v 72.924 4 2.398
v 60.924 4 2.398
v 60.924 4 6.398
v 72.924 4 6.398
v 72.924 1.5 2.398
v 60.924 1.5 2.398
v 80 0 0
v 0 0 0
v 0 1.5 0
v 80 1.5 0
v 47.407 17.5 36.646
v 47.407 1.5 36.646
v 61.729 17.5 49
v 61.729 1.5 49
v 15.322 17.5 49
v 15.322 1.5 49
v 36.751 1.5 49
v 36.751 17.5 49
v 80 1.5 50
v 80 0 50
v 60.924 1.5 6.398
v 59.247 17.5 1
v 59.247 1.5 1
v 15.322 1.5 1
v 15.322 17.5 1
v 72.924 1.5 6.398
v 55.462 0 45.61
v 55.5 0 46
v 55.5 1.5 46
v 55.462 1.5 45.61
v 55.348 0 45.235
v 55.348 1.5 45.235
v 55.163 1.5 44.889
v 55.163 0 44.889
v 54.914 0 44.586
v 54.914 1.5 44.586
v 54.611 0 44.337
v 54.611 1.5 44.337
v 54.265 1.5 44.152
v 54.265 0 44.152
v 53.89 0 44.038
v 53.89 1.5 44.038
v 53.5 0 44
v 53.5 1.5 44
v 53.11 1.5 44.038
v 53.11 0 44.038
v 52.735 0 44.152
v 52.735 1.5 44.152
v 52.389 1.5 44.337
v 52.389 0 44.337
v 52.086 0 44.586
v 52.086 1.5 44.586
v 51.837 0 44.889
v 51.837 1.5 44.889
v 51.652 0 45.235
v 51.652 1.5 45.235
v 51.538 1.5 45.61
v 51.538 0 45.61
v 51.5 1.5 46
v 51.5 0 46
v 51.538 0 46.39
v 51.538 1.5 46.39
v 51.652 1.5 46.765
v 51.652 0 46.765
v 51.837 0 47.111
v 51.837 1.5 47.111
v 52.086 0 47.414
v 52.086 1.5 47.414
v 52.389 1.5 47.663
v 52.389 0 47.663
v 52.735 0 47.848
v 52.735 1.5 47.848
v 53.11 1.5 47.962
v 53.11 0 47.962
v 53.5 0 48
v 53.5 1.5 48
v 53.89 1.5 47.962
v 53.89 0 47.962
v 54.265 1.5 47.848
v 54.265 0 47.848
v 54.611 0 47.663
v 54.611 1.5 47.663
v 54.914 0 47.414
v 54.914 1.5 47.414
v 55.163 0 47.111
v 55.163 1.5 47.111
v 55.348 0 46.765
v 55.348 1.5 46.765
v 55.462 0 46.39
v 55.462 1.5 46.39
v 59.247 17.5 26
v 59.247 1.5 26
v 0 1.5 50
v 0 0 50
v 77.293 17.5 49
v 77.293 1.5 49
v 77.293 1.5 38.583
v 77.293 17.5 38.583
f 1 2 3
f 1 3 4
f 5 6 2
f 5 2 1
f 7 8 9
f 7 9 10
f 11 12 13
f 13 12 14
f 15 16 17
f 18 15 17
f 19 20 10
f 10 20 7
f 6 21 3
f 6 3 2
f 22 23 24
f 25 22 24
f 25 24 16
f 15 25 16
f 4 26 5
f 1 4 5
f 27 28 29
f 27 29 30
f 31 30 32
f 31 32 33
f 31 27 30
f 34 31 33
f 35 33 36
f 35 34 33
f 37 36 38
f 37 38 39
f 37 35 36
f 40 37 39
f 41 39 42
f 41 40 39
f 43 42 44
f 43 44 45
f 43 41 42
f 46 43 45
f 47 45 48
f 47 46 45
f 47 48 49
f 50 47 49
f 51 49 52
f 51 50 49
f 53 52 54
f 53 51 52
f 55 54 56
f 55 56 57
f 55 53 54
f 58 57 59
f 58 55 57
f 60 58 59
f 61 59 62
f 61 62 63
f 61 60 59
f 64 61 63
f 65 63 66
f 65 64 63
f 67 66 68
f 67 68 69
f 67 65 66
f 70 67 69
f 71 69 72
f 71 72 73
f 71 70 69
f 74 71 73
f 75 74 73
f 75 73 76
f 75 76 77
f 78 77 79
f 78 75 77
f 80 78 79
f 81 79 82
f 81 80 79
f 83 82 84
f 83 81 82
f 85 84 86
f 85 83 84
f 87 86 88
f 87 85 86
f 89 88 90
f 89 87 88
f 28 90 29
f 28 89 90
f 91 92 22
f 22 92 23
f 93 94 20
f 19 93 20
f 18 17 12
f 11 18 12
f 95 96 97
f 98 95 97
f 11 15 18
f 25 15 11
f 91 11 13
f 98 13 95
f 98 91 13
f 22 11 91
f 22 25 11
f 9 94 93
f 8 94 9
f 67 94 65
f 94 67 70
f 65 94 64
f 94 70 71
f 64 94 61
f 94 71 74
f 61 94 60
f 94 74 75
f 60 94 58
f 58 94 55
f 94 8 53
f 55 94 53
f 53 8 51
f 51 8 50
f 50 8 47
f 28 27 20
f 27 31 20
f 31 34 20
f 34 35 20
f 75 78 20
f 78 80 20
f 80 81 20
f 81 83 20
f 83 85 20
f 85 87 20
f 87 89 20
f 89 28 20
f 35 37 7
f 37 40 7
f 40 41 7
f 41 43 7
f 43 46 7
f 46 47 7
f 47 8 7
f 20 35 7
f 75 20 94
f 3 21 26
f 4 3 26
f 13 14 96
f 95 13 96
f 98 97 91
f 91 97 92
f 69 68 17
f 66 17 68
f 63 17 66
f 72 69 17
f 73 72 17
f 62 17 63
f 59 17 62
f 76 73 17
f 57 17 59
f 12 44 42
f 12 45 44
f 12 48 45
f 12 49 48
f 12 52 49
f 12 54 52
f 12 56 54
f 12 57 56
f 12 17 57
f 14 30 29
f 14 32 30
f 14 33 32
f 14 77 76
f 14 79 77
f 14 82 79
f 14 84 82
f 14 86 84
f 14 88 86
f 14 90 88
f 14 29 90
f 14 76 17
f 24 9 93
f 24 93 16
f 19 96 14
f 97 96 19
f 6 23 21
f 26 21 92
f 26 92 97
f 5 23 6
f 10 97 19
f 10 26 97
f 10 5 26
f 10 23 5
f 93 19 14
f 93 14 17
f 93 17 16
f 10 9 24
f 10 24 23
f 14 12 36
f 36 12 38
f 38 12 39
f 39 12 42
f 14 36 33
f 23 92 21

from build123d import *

# Parameters (mm, degrees)
SKETCH2_W           = 80
SKETCH2_H           = 50
SKETCH2_R           = 2
BOSS_EXTRUDE1_DEPTH = 1.5
BOSS_EXTRUDE2_DEPTH = 17.5
SKETCH2_5_W         = 12
SKETCH2_5_H         = 4
BOSS_EXTRUDE3_DEPTH = 4


with BuildPart() as part:
    # Sketch2 → Boss-Extrude1 (new body)
    with BuildSketch(Plane(origin=(0, 0, 0), x_dir=(1, 0, 0), z_dir=(0, 1, 0))):
        with Locations((40, -25)):
            Rectangle(SKETCH2_W, SKETCH2_H)
        with Locations((53.5, -46)):
            Circle(SKETCH2_R, mode=Mode.SUBTRACT)
    extrude(amount=BOSS_EXTRUDE1_DEPTH)

    # Sketch2<3> → Boss-Extrude2 (add)
    with BuildSketch(Plane(origin=(0, 0, 0), x_dir=(1, 0, 0), z_dir=(0, 1, 0))):
        Polygon((47.407334239, -36.646178921), (61.72925499, -49), (77.292723547, -49), (77.292723547, -38.583095808), (59.246513421, -26), (59.246513421, -1), (15.322098265, -1), (15.322098265, -49), (36.751159142, -49), align=None)
    extrude(amount=BOSS_EXTRUDE2_DEPTH)

    # Sketch2<5> → Boss-Extrude3 (add)
    with BuildSketch(Plane(origin=(0, 0, 0), x_dir=(1, 0, 0), z_dir=(0, 1, 0))):
        with Locations((66.923917494, -4.397775479)):
            Rectangle(SKETCH2_5_W, SKETCH2_5_H)
    extrude(amount=BOSS_EXTRUDE3_DEPTH)


solid = part.part
